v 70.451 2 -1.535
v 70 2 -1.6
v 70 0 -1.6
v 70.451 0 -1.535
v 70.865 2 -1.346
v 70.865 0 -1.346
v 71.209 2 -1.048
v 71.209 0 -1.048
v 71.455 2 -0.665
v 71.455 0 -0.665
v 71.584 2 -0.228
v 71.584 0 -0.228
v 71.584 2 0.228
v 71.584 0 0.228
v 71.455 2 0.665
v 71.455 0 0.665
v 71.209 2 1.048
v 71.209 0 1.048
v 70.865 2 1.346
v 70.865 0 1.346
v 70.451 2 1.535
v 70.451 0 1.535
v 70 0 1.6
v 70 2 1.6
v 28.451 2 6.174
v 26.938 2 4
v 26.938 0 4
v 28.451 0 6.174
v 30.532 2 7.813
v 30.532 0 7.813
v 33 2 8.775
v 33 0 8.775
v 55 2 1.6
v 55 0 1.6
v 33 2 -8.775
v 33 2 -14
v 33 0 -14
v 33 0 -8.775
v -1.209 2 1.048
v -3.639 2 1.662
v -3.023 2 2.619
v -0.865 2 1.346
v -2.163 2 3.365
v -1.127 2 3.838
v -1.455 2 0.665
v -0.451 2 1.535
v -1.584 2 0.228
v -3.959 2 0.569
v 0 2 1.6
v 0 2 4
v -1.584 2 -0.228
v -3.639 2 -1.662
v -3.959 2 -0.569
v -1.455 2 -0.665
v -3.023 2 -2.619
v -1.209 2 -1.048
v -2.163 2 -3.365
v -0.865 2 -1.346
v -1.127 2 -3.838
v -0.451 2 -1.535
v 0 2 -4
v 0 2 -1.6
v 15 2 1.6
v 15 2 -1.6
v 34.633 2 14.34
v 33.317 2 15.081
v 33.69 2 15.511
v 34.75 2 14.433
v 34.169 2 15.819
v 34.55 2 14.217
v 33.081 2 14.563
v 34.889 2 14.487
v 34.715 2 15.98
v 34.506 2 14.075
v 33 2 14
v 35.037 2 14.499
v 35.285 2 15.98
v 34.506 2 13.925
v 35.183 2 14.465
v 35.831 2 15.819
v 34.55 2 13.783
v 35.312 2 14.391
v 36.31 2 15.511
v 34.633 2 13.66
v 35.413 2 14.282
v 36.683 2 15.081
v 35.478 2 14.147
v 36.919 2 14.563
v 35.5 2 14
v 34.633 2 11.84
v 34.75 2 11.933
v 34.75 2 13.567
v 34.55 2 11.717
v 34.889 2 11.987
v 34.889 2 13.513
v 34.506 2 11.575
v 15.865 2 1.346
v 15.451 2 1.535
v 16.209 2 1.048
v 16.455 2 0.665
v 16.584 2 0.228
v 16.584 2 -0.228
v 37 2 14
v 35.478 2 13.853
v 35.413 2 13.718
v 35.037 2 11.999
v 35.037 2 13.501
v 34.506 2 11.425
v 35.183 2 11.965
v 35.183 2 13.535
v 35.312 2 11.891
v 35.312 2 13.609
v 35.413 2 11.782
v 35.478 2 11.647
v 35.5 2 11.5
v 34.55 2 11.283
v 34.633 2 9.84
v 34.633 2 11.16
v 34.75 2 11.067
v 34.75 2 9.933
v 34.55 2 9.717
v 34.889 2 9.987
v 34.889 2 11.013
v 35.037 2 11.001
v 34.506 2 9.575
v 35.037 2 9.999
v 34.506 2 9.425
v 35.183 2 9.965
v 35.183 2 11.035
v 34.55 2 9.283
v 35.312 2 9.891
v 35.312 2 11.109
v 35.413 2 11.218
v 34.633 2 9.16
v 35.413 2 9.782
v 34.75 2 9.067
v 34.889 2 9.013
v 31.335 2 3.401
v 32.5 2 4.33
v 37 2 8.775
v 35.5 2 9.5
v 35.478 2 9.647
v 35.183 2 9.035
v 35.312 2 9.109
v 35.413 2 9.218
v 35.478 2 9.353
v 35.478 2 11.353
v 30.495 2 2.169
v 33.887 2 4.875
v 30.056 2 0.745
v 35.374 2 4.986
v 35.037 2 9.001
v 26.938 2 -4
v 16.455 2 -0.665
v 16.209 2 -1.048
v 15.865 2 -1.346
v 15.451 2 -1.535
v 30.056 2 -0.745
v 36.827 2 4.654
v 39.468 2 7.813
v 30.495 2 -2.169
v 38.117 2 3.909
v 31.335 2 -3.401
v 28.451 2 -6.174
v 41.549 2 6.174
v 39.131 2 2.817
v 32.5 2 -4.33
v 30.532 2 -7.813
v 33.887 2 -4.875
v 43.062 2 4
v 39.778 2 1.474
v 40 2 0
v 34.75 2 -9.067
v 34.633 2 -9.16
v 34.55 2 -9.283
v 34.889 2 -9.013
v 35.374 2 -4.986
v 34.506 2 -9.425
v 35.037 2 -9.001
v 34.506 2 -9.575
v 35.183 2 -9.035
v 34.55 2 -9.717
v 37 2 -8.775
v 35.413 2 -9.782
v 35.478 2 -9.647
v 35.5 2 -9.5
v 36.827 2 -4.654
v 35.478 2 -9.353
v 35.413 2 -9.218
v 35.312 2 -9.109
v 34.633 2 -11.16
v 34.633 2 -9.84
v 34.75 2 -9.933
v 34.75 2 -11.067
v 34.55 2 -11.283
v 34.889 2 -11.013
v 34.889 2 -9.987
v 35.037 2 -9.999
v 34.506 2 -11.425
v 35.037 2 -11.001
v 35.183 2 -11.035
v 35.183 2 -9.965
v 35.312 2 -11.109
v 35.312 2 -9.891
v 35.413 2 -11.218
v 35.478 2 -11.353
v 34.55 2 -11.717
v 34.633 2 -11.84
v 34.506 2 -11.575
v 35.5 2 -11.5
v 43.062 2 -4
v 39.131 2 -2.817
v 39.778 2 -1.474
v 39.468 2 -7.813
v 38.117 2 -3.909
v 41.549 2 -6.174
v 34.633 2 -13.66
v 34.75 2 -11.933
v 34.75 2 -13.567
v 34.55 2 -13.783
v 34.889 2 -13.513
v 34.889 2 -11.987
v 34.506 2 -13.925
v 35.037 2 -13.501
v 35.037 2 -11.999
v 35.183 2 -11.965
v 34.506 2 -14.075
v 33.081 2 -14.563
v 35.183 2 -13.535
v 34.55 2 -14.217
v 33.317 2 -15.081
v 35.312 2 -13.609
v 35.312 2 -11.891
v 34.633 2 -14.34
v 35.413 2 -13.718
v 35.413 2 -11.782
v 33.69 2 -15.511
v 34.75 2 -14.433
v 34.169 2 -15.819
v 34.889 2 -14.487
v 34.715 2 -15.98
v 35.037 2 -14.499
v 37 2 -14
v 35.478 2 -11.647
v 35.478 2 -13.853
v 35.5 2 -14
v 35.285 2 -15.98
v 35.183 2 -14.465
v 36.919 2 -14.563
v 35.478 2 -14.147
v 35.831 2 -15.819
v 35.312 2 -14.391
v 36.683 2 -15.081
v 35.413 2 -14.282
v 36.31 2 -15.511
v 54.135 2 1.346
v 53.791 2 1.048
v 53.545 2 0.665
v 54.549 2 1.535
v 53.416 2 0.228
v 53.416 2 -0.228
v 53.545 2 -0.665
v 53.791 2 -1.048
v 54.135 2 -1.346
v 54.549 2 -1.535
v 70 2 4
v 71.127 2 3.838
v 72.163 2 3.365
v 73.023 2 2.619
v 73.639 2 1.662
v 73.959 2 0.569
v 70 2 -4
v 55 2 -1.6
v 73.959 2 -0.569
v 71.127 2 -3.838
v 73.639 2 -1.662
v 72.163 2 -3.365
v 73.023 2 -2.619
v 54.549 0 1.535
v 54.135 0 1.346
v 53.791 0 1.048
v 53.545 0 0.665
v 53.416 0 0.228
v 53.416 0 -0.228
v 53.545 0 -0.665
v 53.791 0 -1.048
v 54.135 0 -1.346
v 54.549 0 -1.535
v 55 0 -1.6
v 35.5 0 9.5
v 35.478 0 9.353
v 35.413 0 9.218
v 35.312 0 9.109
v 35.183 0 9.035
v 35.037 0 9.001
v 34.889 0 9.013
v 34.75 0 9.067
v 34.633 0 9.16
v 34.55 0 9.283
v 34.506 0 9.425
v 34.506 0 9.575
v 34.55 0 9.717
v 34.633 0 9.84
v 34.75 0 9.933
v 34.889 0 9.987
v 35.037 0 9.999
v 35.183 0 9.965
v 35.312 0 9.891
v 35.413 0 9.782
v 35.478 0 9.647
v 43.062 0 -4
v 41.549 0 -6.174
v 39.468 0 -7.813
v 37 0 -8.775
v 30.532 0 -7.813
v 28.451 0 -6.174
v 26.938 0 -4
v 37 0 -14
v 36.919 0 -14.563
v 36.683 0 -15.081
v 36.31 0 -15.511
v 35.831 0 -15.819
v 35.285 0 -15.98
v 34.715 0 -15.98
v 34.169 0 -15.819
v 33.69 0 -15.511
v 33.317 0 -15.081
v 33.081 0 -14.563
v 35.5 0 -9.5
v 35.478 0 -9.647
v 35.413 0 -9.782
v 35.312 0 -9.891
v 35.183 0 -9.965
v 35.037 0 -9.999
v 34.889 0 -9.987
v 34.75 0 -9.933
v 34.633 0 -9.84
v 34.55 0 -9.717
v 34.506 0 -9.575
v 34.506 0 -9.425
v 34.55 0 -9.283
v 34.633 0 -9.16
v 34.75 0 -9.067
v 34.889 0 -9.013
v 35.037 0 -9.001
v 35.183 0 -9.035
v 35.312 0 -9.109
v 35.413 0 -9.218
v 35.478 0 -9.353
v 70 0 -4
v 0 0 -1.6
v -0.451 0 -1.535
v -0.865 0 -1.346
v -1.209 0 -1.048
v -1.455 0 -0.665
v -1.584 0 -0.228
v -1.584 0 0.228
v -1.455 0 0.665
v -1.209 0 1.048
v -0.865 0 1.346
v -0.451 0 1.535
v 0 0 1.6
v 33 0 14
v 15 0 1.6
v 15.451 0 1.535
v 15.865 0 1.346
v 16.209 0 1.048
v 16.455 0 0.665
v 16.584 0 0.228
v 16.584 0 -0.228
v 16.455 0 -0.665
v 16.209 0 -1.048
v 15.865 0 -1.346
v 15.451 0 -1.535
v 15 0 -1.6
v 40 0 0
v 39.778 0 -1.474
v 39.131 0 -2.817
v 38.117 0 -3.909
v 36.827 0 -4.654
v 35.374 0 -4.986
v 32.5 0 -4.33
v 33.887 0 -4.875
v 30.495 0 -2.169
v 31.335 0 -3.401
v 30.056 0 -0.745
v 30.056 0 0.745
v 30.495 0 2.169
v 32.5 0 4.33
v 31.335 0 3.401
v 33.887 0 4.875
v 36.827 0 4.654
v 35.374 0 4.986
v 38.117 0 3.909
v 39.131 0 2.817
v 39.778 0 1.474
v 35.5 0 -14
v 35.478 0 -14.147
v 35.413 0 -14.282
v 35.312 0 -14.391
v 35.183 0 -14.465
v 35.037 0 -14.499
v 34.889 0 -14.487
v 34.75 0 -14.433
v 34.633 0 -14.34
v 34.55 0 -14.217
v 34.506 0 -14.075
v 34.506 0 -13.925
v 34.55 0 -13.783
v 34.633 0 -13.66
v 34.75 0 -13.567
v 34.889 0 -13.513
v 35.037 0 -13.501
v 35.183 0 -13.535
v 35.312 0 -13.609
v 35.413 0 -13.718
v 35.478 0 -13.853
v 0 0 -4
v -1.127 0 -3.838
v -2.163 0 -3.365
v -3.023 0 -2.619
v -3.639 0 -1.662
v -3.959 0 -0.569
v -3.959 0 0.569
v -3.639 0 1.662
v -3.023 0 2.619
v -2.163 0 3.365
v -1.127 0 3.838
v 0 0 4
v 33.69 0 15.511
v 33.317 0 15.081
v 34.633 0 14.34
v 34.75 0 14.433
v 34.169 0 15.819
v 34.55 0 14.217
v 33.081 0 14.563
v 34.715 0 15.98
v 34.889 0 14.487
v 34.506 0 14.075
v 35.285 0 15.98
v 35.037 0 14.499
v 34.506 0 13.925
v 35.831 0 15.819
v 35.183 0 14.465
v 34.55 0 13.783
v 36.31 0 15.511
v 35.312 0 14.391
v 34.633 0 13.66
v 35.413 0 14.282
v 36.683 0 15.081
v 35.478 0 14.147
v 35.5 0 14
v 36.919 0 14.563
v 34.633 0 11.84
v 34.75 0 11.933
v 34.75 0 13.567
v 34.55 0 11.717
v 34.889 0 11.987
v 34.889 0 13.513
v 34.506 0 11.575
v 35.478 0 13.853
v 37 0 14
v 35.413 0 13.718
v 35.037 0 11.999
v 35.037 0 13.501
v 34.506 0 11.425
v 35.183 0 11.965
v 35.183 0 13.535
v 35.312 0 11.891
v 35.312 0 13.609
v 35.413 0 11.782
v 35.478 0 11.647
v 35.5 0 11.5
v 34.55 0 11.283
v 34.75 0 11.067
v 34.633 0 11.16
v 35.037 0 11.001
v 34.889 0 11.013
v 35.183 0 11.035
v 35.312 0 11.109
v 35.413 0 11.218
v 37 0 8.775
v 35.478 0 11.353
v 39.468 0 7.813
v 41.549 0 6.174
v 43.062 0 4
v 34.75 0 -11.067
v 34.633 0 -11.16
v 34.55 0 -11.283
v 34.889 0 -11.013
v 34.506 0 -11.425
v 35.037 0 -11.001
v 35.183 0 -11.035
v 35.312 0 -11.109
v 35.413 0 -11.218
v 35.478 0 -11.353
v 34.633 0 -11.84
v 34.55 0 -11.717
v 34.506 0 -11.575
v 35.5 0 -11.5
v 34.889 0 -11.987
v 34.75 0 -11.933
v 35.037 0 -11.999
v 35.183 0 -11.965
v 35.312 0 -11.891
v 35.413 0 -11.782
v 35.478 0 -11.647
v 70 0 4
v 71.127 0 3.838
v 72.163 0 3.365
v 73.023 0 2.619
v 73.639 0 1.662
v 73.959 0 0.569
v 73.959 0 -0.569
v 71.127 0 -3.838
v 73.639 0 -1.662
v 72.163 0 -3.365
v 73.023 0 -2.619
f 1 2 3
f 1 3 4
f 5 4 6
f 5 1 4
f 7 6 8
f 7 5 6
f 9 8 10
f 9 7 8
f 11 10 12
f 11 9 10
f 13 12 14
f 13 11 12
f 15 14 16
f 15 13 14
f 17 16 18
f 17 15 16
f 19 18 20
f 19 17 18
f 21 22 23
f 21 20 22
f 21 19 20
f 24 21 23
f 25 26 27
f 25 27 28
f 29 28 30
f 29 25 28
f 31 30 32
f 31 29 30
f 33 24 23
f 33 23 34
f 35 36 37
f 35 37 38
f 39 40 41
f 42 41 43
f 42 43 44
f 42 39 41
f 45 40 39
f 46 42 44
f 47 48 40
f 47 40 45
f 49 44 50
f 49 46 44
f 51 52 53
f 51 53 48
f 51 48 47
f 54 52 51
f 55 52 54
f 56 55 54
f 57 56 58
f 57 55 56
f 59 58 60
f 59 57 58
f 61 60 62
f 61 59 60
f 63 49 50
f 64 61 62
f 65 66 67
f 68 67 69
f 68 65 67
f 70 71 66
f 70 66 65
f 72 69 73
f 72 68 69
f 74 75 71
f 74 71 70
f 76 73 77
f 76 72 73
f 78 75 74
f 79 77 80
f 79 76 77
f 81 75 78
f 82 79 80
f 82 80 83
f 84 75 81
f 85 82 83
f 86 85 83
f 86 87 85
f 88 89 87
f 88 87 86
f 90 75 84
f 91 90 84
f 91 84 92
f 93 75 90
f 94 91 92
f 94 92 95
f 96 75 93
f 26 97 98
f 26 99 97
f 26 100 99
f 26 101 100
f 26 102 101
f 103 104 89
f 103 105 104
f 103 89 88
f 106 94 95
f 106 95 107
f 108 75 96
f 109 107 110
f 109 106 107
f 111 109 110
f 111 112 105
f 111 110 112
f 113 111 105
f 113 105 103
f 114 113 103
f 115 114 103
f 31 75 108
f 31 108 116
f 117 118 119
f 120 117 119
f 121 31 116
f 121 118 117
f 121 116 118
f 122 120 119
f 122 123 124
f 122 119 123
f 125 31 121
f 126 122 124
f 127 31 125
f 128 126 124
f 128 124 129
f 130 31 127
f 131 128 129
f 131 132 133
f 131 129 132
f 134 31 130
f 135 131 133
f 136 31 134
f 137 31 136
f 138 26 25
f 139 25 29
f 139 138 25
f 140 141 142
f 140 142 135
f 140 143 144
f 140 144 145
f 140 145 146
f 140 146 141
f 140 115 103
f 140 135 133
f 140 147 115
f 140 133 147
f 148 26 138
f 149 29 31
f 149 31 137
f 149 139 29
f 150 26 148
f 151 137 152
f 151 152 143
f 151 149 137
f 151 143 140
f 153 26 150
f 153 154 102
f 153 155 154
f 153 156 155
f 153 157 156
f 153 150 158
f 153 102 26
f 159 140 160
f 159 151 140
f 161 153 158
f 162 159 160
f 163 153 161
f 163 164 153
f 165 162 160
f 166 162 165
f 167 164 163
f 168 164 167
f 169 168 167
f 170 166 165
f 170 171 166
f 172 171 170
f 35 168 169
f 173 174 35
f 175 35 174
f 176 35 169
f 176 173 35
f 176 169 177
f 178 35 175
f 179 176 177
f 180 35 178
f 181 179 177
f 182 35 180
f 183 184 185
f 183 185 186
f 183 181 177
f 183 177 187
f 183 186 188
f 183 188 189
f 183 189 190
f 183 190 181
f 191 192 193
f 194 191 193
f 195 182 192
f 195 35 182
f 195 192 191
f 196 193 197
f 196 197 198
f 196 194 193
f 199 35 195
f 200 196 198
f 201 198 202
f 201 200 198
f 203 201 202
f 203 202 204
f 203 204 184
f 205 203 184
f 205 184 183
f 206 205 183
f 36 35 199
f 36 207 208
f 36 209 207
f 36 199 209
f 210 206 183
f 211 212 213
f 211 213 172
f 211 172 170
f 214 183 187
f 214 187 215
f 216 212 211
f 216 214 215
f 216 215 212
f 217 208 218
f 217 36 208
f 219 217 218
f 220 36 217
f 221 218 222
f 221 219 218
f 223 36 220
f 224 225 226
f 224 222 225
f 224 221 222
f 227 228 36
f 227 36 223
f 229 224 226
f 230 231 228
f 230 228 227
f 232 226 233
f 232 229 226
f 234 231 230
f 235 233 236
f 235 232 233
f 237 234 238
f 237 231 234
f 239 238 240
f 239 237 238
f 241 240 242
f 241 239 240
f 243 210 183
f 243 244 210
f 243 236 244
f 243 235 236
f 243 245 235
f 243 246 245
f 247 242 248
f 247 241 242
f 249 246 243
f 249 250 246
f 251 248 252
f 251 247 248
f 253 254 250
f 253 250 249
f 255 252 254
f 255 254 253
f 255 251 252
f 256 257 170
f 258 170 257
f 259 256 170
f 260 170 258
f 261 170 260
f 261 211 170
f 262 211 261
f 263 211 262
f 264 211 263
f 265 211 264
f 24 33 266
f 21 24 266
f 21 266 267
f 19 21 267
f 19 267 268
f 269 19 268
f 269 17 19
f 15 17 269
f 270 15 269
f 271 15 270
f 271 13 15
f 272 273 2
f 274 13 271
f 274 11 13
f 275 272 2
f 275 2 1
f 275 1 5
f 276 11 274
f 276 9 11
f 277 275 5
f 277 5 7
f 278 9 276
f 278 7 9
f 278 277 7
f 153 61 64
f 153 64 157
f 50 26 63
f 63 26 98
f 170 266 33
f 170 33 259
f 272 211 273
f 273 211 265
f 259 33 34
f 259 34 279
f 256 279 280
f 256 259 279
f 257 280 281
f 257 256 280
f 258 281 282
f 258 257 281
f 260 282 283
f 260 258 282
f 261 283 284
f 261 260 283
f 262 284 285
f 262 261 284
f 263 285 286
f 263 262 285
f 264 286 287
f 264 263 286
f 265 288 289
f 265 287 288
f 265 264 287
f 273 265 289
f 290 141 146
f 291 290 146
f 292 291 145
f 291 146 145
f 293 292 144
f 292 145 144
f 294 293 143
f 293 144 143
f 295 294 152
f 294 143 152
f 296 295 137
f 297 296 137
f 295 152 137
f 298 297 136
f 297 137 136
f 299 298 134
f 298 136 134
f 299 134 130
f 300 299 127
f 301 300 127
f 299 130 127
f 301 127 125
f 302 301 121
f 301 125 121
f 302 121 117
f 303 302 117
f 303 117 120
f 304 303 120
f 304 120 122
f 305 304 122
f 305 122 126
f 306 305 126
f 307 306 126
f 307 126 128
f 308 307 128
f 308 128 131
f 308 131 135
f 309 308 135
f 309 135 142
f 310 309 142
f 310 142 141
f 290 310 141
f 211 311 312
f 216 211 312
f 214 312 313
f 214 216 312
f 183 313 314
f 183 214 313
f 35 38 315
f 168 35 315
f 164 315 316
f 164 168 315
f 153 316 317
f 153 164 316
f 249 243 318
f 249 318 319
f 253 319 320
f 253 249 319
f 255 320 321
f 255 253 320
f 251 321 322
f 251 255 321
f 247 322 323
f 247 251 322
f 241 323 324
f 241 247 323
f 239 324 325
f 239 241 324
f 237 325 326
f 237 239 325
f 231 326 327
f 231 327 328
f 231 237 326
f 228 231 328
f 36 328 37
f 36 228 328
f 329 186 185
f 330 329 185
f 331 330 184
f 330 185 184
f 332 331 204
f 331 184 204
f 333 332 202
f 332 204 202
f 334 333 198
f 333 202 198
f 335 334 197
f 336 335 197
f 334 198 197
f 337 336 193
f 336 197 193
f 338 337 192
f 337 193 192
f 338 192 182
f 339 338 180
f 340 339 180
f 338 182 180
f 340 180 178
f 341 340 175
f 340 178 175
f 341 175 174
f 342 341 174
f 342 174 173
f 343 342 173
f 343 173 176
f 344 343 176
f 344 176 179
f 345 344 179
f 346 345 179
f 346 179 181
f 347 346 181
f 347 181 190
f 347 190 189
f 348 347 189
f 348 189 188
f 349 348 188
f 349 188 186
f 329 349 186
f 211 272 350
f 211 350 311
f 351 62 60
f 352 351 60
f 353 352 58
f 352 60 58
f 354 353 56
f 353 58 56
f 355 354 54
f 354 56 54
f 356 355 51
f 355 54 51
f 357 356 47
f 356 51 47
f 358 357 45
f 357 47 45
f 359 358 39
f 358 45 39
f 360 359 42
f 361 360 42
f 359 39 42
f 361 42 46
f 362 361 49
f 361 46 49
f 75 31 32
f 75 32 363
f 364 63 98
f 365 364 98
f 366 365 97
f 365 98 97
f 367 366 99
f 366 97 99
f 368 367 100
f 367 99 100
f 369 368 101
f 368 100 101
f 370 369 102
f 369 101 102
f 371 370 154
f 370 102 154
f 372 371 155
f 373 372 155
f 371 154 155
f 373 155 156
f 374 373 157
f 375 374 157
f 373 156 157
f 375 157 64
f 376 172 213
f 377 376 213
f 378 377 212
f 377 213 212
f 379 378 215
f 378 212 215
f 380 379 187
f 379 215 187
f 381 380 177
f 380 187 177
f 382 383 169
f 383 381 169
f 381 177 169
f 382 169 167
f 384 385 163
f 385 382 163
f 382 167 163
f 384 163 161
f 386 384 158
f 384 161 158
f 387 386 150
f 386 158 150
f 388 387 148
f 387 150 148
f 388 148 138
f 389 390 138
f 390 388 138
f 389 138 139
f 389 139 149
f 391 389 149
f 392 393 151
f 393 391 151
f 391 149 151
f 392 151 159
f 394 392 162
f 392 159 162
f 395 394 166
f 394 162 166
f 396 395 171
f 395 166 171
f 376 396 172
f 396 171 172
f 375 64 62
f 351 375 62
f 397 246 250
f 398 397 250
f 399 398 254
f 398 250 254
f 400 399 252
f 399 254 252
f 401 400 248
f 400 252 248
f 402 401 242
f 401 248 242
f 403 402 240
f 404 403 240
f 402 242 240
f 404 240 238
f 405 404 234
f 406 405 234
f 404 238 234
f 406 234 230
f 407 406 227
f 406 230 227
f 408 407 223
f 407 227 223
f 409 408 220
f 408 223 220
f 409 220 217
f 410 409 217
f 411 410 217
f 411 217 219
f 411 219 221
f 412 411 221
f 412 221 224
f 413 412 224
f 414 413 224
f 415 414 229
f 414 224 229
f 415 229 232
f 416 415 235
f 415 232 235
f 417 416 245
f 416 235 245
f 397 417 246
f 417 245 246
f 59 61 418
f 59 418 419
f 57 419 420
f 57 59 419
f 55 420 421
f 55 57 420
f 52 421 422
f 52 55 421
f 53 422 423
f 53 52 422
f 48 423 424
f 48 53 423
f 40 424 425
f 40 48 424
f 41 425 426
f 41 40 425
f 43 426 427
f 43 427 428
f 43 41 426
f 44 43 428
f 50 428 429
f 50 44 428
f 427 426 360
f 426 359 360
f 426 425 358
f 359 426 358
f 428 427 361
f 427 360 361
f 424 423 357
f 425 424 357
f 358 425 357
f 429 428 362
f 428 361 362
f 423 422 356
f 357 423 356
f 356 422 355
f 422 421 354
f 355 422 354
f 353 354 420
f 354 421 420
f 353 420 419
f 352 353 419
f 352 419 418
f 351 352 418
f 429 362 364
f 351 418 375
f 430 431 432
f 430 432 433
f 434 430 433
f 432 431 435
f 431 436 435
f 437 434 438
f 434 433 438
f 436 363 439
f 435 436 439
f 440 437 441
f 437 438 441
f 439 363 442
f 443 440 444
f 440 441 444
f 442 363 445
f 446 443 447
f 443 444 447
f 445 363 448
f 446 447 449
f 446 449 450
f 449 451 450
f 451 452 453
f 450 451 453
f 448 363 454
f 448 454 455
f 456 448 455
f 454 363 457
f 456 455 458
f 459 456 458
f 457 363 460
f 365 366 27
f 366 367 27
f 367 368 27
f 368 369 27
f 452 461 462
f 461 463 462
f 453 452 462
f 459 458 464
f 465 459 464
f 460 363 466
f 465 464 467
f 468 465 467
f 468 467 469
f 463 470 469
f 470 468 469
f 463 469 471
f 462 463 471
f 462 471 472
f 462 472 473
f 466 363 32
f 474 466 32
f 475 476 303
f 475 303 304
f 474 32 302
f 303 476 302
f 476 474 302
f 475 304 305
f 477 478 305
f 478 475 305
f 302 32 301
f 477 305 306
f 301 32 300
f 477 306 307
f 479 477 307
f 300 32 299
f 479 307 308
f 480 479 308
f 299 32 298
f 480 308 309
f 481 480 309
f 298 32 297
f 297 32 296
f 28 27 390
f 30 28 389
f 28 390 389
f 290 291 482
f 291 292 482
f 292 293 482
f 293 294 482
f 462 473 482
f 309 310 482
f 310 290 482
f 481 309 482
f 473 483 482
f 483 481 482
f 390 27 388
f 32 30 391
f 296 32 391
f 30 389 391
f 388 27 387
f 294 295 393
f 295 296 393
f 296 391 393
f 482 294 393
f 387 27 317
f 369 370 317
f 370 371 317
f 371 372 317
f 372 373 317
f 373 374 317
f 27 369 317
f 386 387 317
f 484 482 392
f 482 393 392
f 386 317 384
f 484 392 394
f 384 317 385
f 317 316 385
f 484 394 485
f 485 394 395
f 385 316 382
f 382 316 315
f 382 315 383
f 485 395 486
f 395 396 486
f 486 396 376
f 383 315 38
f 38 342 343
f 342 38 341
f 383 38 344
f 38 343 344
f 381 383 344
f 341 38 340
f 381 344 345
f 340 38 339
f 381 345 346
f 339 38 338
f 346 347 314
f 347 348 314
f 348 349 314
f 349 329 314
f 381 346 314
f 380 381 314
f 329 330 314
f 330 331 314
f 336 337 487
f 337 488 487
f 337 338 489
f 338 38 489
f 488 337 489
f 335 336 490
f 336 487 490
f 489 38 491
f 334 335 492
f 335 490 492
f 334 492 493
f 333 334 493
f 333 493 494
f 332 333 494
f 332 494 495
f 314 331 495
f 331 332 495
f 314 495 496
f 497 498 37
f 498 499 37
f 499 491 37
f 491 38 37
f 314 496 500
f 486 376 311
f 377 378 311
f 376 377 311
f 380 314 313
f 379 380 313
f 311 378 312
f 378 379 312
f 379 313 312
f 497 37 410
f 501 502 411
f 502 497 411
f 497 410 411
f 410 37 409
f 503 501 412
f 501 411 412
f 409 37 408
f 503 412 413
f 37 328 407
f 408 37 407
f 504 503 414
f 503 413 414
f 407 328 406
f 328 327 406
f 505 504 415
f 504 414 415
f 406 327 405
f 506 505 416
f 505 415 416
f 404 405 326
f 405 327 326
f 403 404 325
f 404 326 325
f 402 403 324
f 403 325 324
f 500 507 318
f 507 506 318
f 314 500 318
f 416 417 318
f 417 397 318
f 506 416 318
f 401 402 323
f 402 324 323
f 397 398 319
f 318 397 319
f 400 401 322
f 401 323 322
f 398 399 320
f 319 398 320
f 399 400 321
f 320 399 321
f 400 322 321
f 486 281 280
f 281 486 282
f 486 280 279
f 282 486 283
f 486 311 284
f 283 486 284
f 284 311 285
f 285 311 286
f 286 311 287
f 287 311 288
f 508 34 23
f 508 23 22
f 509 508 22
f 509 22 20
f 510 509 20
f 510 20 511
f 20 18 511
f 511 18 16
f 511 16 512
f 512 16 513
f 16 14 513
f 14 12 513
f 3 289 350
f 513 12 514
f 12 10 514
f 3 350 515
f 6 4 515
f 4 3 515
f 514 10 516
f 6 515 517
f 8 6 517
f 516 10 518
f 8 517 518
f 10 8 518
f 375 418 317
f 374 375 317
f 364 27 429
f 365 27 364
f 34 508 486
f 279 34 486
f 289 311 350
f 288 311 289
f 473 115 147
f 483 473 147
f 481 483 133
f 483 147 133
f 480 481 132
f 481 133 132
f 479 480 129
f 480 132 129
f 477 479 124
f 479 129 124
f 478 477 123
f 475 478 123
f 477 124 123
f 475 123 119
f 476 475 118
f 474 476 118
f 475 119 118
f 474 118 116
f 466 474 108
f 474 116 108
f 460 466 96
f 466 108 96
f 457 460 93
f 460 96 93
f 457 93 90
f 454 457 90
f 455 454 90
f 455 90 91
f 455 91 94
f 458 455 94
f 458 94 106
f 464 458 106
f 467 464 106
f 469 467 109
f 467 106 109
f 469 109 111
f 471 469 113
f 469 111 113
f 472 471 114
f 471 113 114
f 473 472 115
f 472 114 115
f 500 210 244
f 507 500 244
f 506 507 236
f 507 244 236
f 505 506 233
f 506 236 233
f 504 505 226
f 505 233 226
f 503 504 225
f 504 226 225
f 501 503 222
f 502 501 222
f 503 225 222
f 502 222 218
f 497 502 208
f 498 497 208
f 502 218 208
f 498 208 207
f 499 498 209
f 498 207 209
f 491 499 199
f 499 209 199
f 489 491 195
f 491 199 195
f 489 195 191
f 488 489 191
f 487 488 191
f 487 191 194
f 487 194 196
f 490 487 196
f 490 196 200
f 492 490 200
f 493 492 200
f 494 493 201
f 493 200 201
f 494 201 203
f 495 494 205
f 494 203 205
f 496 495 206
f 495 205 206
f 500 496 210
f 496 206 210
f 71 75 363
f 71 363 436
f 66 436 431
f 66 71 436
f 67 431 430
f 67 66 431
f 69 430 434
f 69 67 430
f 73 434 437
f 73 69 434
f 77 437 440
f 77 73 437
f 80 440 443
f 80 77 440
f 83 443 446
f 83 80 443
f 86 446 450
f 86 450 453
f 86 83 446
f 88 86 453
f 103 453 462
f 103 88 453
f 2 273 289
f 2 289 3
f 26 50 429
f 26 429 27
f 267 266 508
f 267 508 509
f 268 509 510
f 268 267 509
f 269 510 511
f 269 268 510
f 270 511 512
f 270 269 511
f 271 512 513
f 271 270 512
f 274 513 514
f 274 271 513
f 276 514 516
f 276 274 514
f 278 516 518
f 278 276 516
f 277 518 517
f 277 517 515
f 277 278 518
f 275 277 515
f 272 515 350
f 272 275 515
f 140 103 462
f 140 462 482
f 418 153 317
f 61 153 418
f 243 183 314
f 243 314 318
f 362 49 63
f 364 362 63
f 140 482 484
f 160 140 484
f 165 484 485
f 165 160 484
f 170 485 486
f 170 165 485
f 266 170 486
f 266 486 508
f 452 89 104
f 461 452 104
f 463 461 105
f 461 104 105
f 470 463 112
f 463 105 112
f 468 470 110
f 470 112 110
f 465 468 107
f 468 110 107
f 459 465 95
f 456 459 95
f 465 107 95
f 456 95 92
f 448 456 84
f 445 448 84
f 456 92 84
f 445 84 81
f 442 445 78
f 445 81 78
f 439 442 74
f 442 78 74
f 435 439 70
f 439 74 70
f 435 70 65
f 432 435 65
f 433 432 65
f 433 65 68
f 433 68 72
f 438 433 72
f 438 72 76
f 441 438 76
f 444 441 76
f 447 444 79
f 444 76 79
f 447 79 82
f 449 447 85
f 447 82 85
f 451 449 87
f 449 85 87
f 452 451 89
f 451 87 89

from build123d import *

# Parameters (mm, degrees)
SKETCH1_R               = 1.6
BOSS_EXTRUDE1_DEPTH     = 2
SKETCH2_R               = 0.5
BOSS_EXTRUDE2_DEPTH     = 2
SKETCH3_R               = 1.6
BOSS_EXTRUDE3_DEPTH     = 4
SKETCH4_R               = 5.618069601
SKETCH4_R_2             = 1.5
SKETCH4_R_3             = 9.019483561
CUT_EXTRUDE1_DEPTH      = 20
CUT_EXTRUDE2_DEPTH      = 10
CUT_EXTRUDE2_DEPTH_BACK = 10
SKETCH6_W               = 4
SKETCH6_H               = 1
SKETCH6_R               = 0.5
BOSS_EXTRUDE5_DEPTH     = 2
SKETCH7_R               = 9
SKETCH7_R_2             = 5
BOSS_EXTRUDE6_DEPTH     = 2
SKETCH8_R               = 5
CUT_EXTRUDE3_DEPTH      = 10


with BuildPart() as part:
    # Sketch1 → Boss-Extrude1 (new body)
    with BuildSketch(Plane(origin=(0, 0, 0), x_dir=(1, 0, 0), z_dir=(0, 1, 0))):
        with BuildLine():
            Line((0, 3), (70, 3))
            ThreePointArc((70, 3), (73, 0), (70, -3))
            Line((70, -3), (0, -3))
            ThreePointArc((0, -3), (-3, 0), (0, 3))
        make_face()
        Circle(SKETCH1_R, mode=Mode.SUBTRACT)
        with Locations((70, 0)):
            Circle(SKETCH1_R, mode=Mode.SUBTRACT)
        with Locations((35, 0)):
            Circle(SKETCH1_R, mode=Mode.SUBTRACT)
    extrude(amount=BOSS_EXTRUDE1_DEPTH)

    # Sketch2 → Boss-Extrude2 (add)
    with BuildSketch(Plane(origin=(0, 2, 0), x_dir=(1, 0, 0), z_dir=(0, 1, 0))):
        with BuildLine():
            Line((37, -3), (33, -3))
            Line((33, -3), (33, -14))
            ThreePointArc((33, -14), (35, -16), (37, -14))
            Line((37, -14), (37, -3))
        make_face()
        with Locations((35, -11.5)):
            Circle(SKETCH2_R, mode=Mode.SUBTRACT)
        with Locations((35, -14)):
            Circle(SKETCH2_R, mode=Mode.SUBTRACT)
        with Locations((35, -9.5)):
            Circle(SKETCH2_R, mode=Mode.SUBTRACT)
        with BuildLine():
            Line((33, 14), (33, 3))
            Line((33, 3), (37, 3))
            Line((37, 3), (37, 14))
            ThreePointArc((37, 14), (35, 16), (33, 14))
        make_face()
        with Locations((35, 9.5)):
            Circle(SKETCH2_R, mode=Mode.SUBTRACT)
        with Locations((35, 14)):
            Circle(SKETCH2_R, mode=Mode.SUBTRACT)
        with Locations((35, 11.5)):
            Circle(SKETCH2_R, mode=Mode.SUBTRACT)
    extrude(amount=-BOSS_EXTRUDE2_DEPTH)

    # Sketch3 → Boss-Extrude3 (add)
    with BuildSketch(Plane(origin=(0, 0, 0), x_dir=(-1, 0, 0), z_dir=(0, -1, 0))):
        with Locations((-70, 0)):
            Circle(SKETCH3_R)
        Circle(SKETCH3_R)
    extrude(amount=-BOSS_EXTRUDE3_DEPTH)

    # Sketch4 → Cut-Extrude1 (cut)
    with BuildSketch(Plane(origin=(0, 2, 0), x_dir=(1, 0, 0), z_dir=(0, 1, 0))):
        with Locations((70, 0)):
            Circle(SKETCH4_R)
        with Locations((70, 0)):
            Circle(SKETCH4_R_2, mode=Mode.SUBTRACT)
        Circle(SKETCH4_R_3)
        Circle(SKETCH4_R_2, mode=Mode.SUBTRACT)
    extrude(amount=CUT_EXTRUDE1_DEPTH, mode=Mode.SUBTRACT)

    # Sketch5 → Cut-Extrude2 (cut, two sides)
    with BuildSketch(Plane(origin=(0, 2, 0), x_dir=(1, 0, 0), z_dir=(0, 1, 0))) as cut_extrude2_sk:
        with BuildLine():
            Line((55, 1.6), (70, 1.6))
            ThreePointArc((70, 1.6), (71.6, 0), (70, -1.6))
            Line((70, -1.6), (55, -1.6))
            ThreePointArc((55, -1.6), (53.4, 0), (55, 1.6))
        make_face()
        with BuildLine():
            Line((0, -1.6), (15, -1.6))
            ThreePointArc((15, -1.6), (16.6, 0), (15, 1.6))
            Line((15, 1.6), (0, 1.6))
            ThreePointArc((0, 1.6), (-1.6, 0), (0, -1.6))
        make_face()
    extrude(amount=CUT_EXTRUDE2_DEPTH, mode=Mode.SUBTRACT)
    extrude(cut_extrude2_sk.sketch, amount=-CUT_EXTRUDE2_DEPTH_BACK, mode=Mode.SUBTRACT)

    # Sketch6 → Boss-Extrude5 (add)
    with BuildSketch(Plane(origin=(0, 2, 0), x_dir=(1, 0, 0), z_dir=(0, 1, 0))):
        with Locations((35, 3.5)):
            Rectangle(SKETCH6_W, SKETCH6_H)
        with BuildLine():
            Line((33, 4), (0, 4))
            ThreePointArc((0, 4), (-4, 0), (0, -4))
            Line((0, -4), (33, -4))
            Line((33, -4), (33, -3))
            Line((33, -3), (0, -3))
            ThreePointArc((0, -3), (-3, 0), (0, 3))
            Line((0, 3), (33, 3))
            Line((33, 3), (33, 4))
        make_face()
        with BuildLine():
            Line((70, 4), (37, 4))
            Line((37, 4), (37, 3))
            Line((37, 3), (70, 3))
            ThreePointArc((70, 3), (73, 0), (70, -3))
            Line((70, -3), (37, -3))
            Line((37, -3), (37, -4))
            Line((37, -4), (70, -4))
            ThreePointArc((70, -4), (74, 0), (70, 4))
        make_face()
        with Locations((35, -3.5)):
            Rectangle(SKETCH6_W, SKETCH6_H)
        with BuildLine():
            Line((33, 14), (33, 4))
            Line((33, 4), (37, 4))
            Line((37, 4), (37, 14))
            ThreePointArc((37, 14), (35, 16), (33, 14))
        make_face()
        with Locations((35, 9.5)):
            Circle(SKETCH6_R, mode=Mode.SUBTRACT)
        with Locations((35, 11.5)):
            Circle(SKETCH6_R, mode=Mode.SUBTRACT)
        with Locations((35, 14)):
            Circle(SKETCH6_R, mode=Mode.SUBTRACT)
    extrude(amount=-BOSS_EXTRUDE5_DEPTH)

    # Sketch7 → Boss-Extrude6 (add)
    with BuildSketch(Plane(origin=(0, 2, 0), x_dir=(1, 0, 0), z_dir=(0, 1, 0))):
        with Locations((35, 0)):
            Circle(SKETCH7_R)
        with Locations((35, 0)):
            Circle(SKETCH7_R_2, mode=Mode.SUBTRACT)
    extrude(amount=-BOSS_EXTRUDE6_DEPTH)

    # Sketch8 → Cut-Extrude3 (cut)
    with BuildSketch(Plane(origin=(0, 2, 0), x_dir=(1, 0, 0), z_dir=(0, 1, 0))):
        with Locations((35, 0)):
            Circle(SKETCH8_R)
    extrude(amount=-CUT_EXTRUDE3_DEPTH, mode=Mode.SUBTRACT)


solid = part.part
